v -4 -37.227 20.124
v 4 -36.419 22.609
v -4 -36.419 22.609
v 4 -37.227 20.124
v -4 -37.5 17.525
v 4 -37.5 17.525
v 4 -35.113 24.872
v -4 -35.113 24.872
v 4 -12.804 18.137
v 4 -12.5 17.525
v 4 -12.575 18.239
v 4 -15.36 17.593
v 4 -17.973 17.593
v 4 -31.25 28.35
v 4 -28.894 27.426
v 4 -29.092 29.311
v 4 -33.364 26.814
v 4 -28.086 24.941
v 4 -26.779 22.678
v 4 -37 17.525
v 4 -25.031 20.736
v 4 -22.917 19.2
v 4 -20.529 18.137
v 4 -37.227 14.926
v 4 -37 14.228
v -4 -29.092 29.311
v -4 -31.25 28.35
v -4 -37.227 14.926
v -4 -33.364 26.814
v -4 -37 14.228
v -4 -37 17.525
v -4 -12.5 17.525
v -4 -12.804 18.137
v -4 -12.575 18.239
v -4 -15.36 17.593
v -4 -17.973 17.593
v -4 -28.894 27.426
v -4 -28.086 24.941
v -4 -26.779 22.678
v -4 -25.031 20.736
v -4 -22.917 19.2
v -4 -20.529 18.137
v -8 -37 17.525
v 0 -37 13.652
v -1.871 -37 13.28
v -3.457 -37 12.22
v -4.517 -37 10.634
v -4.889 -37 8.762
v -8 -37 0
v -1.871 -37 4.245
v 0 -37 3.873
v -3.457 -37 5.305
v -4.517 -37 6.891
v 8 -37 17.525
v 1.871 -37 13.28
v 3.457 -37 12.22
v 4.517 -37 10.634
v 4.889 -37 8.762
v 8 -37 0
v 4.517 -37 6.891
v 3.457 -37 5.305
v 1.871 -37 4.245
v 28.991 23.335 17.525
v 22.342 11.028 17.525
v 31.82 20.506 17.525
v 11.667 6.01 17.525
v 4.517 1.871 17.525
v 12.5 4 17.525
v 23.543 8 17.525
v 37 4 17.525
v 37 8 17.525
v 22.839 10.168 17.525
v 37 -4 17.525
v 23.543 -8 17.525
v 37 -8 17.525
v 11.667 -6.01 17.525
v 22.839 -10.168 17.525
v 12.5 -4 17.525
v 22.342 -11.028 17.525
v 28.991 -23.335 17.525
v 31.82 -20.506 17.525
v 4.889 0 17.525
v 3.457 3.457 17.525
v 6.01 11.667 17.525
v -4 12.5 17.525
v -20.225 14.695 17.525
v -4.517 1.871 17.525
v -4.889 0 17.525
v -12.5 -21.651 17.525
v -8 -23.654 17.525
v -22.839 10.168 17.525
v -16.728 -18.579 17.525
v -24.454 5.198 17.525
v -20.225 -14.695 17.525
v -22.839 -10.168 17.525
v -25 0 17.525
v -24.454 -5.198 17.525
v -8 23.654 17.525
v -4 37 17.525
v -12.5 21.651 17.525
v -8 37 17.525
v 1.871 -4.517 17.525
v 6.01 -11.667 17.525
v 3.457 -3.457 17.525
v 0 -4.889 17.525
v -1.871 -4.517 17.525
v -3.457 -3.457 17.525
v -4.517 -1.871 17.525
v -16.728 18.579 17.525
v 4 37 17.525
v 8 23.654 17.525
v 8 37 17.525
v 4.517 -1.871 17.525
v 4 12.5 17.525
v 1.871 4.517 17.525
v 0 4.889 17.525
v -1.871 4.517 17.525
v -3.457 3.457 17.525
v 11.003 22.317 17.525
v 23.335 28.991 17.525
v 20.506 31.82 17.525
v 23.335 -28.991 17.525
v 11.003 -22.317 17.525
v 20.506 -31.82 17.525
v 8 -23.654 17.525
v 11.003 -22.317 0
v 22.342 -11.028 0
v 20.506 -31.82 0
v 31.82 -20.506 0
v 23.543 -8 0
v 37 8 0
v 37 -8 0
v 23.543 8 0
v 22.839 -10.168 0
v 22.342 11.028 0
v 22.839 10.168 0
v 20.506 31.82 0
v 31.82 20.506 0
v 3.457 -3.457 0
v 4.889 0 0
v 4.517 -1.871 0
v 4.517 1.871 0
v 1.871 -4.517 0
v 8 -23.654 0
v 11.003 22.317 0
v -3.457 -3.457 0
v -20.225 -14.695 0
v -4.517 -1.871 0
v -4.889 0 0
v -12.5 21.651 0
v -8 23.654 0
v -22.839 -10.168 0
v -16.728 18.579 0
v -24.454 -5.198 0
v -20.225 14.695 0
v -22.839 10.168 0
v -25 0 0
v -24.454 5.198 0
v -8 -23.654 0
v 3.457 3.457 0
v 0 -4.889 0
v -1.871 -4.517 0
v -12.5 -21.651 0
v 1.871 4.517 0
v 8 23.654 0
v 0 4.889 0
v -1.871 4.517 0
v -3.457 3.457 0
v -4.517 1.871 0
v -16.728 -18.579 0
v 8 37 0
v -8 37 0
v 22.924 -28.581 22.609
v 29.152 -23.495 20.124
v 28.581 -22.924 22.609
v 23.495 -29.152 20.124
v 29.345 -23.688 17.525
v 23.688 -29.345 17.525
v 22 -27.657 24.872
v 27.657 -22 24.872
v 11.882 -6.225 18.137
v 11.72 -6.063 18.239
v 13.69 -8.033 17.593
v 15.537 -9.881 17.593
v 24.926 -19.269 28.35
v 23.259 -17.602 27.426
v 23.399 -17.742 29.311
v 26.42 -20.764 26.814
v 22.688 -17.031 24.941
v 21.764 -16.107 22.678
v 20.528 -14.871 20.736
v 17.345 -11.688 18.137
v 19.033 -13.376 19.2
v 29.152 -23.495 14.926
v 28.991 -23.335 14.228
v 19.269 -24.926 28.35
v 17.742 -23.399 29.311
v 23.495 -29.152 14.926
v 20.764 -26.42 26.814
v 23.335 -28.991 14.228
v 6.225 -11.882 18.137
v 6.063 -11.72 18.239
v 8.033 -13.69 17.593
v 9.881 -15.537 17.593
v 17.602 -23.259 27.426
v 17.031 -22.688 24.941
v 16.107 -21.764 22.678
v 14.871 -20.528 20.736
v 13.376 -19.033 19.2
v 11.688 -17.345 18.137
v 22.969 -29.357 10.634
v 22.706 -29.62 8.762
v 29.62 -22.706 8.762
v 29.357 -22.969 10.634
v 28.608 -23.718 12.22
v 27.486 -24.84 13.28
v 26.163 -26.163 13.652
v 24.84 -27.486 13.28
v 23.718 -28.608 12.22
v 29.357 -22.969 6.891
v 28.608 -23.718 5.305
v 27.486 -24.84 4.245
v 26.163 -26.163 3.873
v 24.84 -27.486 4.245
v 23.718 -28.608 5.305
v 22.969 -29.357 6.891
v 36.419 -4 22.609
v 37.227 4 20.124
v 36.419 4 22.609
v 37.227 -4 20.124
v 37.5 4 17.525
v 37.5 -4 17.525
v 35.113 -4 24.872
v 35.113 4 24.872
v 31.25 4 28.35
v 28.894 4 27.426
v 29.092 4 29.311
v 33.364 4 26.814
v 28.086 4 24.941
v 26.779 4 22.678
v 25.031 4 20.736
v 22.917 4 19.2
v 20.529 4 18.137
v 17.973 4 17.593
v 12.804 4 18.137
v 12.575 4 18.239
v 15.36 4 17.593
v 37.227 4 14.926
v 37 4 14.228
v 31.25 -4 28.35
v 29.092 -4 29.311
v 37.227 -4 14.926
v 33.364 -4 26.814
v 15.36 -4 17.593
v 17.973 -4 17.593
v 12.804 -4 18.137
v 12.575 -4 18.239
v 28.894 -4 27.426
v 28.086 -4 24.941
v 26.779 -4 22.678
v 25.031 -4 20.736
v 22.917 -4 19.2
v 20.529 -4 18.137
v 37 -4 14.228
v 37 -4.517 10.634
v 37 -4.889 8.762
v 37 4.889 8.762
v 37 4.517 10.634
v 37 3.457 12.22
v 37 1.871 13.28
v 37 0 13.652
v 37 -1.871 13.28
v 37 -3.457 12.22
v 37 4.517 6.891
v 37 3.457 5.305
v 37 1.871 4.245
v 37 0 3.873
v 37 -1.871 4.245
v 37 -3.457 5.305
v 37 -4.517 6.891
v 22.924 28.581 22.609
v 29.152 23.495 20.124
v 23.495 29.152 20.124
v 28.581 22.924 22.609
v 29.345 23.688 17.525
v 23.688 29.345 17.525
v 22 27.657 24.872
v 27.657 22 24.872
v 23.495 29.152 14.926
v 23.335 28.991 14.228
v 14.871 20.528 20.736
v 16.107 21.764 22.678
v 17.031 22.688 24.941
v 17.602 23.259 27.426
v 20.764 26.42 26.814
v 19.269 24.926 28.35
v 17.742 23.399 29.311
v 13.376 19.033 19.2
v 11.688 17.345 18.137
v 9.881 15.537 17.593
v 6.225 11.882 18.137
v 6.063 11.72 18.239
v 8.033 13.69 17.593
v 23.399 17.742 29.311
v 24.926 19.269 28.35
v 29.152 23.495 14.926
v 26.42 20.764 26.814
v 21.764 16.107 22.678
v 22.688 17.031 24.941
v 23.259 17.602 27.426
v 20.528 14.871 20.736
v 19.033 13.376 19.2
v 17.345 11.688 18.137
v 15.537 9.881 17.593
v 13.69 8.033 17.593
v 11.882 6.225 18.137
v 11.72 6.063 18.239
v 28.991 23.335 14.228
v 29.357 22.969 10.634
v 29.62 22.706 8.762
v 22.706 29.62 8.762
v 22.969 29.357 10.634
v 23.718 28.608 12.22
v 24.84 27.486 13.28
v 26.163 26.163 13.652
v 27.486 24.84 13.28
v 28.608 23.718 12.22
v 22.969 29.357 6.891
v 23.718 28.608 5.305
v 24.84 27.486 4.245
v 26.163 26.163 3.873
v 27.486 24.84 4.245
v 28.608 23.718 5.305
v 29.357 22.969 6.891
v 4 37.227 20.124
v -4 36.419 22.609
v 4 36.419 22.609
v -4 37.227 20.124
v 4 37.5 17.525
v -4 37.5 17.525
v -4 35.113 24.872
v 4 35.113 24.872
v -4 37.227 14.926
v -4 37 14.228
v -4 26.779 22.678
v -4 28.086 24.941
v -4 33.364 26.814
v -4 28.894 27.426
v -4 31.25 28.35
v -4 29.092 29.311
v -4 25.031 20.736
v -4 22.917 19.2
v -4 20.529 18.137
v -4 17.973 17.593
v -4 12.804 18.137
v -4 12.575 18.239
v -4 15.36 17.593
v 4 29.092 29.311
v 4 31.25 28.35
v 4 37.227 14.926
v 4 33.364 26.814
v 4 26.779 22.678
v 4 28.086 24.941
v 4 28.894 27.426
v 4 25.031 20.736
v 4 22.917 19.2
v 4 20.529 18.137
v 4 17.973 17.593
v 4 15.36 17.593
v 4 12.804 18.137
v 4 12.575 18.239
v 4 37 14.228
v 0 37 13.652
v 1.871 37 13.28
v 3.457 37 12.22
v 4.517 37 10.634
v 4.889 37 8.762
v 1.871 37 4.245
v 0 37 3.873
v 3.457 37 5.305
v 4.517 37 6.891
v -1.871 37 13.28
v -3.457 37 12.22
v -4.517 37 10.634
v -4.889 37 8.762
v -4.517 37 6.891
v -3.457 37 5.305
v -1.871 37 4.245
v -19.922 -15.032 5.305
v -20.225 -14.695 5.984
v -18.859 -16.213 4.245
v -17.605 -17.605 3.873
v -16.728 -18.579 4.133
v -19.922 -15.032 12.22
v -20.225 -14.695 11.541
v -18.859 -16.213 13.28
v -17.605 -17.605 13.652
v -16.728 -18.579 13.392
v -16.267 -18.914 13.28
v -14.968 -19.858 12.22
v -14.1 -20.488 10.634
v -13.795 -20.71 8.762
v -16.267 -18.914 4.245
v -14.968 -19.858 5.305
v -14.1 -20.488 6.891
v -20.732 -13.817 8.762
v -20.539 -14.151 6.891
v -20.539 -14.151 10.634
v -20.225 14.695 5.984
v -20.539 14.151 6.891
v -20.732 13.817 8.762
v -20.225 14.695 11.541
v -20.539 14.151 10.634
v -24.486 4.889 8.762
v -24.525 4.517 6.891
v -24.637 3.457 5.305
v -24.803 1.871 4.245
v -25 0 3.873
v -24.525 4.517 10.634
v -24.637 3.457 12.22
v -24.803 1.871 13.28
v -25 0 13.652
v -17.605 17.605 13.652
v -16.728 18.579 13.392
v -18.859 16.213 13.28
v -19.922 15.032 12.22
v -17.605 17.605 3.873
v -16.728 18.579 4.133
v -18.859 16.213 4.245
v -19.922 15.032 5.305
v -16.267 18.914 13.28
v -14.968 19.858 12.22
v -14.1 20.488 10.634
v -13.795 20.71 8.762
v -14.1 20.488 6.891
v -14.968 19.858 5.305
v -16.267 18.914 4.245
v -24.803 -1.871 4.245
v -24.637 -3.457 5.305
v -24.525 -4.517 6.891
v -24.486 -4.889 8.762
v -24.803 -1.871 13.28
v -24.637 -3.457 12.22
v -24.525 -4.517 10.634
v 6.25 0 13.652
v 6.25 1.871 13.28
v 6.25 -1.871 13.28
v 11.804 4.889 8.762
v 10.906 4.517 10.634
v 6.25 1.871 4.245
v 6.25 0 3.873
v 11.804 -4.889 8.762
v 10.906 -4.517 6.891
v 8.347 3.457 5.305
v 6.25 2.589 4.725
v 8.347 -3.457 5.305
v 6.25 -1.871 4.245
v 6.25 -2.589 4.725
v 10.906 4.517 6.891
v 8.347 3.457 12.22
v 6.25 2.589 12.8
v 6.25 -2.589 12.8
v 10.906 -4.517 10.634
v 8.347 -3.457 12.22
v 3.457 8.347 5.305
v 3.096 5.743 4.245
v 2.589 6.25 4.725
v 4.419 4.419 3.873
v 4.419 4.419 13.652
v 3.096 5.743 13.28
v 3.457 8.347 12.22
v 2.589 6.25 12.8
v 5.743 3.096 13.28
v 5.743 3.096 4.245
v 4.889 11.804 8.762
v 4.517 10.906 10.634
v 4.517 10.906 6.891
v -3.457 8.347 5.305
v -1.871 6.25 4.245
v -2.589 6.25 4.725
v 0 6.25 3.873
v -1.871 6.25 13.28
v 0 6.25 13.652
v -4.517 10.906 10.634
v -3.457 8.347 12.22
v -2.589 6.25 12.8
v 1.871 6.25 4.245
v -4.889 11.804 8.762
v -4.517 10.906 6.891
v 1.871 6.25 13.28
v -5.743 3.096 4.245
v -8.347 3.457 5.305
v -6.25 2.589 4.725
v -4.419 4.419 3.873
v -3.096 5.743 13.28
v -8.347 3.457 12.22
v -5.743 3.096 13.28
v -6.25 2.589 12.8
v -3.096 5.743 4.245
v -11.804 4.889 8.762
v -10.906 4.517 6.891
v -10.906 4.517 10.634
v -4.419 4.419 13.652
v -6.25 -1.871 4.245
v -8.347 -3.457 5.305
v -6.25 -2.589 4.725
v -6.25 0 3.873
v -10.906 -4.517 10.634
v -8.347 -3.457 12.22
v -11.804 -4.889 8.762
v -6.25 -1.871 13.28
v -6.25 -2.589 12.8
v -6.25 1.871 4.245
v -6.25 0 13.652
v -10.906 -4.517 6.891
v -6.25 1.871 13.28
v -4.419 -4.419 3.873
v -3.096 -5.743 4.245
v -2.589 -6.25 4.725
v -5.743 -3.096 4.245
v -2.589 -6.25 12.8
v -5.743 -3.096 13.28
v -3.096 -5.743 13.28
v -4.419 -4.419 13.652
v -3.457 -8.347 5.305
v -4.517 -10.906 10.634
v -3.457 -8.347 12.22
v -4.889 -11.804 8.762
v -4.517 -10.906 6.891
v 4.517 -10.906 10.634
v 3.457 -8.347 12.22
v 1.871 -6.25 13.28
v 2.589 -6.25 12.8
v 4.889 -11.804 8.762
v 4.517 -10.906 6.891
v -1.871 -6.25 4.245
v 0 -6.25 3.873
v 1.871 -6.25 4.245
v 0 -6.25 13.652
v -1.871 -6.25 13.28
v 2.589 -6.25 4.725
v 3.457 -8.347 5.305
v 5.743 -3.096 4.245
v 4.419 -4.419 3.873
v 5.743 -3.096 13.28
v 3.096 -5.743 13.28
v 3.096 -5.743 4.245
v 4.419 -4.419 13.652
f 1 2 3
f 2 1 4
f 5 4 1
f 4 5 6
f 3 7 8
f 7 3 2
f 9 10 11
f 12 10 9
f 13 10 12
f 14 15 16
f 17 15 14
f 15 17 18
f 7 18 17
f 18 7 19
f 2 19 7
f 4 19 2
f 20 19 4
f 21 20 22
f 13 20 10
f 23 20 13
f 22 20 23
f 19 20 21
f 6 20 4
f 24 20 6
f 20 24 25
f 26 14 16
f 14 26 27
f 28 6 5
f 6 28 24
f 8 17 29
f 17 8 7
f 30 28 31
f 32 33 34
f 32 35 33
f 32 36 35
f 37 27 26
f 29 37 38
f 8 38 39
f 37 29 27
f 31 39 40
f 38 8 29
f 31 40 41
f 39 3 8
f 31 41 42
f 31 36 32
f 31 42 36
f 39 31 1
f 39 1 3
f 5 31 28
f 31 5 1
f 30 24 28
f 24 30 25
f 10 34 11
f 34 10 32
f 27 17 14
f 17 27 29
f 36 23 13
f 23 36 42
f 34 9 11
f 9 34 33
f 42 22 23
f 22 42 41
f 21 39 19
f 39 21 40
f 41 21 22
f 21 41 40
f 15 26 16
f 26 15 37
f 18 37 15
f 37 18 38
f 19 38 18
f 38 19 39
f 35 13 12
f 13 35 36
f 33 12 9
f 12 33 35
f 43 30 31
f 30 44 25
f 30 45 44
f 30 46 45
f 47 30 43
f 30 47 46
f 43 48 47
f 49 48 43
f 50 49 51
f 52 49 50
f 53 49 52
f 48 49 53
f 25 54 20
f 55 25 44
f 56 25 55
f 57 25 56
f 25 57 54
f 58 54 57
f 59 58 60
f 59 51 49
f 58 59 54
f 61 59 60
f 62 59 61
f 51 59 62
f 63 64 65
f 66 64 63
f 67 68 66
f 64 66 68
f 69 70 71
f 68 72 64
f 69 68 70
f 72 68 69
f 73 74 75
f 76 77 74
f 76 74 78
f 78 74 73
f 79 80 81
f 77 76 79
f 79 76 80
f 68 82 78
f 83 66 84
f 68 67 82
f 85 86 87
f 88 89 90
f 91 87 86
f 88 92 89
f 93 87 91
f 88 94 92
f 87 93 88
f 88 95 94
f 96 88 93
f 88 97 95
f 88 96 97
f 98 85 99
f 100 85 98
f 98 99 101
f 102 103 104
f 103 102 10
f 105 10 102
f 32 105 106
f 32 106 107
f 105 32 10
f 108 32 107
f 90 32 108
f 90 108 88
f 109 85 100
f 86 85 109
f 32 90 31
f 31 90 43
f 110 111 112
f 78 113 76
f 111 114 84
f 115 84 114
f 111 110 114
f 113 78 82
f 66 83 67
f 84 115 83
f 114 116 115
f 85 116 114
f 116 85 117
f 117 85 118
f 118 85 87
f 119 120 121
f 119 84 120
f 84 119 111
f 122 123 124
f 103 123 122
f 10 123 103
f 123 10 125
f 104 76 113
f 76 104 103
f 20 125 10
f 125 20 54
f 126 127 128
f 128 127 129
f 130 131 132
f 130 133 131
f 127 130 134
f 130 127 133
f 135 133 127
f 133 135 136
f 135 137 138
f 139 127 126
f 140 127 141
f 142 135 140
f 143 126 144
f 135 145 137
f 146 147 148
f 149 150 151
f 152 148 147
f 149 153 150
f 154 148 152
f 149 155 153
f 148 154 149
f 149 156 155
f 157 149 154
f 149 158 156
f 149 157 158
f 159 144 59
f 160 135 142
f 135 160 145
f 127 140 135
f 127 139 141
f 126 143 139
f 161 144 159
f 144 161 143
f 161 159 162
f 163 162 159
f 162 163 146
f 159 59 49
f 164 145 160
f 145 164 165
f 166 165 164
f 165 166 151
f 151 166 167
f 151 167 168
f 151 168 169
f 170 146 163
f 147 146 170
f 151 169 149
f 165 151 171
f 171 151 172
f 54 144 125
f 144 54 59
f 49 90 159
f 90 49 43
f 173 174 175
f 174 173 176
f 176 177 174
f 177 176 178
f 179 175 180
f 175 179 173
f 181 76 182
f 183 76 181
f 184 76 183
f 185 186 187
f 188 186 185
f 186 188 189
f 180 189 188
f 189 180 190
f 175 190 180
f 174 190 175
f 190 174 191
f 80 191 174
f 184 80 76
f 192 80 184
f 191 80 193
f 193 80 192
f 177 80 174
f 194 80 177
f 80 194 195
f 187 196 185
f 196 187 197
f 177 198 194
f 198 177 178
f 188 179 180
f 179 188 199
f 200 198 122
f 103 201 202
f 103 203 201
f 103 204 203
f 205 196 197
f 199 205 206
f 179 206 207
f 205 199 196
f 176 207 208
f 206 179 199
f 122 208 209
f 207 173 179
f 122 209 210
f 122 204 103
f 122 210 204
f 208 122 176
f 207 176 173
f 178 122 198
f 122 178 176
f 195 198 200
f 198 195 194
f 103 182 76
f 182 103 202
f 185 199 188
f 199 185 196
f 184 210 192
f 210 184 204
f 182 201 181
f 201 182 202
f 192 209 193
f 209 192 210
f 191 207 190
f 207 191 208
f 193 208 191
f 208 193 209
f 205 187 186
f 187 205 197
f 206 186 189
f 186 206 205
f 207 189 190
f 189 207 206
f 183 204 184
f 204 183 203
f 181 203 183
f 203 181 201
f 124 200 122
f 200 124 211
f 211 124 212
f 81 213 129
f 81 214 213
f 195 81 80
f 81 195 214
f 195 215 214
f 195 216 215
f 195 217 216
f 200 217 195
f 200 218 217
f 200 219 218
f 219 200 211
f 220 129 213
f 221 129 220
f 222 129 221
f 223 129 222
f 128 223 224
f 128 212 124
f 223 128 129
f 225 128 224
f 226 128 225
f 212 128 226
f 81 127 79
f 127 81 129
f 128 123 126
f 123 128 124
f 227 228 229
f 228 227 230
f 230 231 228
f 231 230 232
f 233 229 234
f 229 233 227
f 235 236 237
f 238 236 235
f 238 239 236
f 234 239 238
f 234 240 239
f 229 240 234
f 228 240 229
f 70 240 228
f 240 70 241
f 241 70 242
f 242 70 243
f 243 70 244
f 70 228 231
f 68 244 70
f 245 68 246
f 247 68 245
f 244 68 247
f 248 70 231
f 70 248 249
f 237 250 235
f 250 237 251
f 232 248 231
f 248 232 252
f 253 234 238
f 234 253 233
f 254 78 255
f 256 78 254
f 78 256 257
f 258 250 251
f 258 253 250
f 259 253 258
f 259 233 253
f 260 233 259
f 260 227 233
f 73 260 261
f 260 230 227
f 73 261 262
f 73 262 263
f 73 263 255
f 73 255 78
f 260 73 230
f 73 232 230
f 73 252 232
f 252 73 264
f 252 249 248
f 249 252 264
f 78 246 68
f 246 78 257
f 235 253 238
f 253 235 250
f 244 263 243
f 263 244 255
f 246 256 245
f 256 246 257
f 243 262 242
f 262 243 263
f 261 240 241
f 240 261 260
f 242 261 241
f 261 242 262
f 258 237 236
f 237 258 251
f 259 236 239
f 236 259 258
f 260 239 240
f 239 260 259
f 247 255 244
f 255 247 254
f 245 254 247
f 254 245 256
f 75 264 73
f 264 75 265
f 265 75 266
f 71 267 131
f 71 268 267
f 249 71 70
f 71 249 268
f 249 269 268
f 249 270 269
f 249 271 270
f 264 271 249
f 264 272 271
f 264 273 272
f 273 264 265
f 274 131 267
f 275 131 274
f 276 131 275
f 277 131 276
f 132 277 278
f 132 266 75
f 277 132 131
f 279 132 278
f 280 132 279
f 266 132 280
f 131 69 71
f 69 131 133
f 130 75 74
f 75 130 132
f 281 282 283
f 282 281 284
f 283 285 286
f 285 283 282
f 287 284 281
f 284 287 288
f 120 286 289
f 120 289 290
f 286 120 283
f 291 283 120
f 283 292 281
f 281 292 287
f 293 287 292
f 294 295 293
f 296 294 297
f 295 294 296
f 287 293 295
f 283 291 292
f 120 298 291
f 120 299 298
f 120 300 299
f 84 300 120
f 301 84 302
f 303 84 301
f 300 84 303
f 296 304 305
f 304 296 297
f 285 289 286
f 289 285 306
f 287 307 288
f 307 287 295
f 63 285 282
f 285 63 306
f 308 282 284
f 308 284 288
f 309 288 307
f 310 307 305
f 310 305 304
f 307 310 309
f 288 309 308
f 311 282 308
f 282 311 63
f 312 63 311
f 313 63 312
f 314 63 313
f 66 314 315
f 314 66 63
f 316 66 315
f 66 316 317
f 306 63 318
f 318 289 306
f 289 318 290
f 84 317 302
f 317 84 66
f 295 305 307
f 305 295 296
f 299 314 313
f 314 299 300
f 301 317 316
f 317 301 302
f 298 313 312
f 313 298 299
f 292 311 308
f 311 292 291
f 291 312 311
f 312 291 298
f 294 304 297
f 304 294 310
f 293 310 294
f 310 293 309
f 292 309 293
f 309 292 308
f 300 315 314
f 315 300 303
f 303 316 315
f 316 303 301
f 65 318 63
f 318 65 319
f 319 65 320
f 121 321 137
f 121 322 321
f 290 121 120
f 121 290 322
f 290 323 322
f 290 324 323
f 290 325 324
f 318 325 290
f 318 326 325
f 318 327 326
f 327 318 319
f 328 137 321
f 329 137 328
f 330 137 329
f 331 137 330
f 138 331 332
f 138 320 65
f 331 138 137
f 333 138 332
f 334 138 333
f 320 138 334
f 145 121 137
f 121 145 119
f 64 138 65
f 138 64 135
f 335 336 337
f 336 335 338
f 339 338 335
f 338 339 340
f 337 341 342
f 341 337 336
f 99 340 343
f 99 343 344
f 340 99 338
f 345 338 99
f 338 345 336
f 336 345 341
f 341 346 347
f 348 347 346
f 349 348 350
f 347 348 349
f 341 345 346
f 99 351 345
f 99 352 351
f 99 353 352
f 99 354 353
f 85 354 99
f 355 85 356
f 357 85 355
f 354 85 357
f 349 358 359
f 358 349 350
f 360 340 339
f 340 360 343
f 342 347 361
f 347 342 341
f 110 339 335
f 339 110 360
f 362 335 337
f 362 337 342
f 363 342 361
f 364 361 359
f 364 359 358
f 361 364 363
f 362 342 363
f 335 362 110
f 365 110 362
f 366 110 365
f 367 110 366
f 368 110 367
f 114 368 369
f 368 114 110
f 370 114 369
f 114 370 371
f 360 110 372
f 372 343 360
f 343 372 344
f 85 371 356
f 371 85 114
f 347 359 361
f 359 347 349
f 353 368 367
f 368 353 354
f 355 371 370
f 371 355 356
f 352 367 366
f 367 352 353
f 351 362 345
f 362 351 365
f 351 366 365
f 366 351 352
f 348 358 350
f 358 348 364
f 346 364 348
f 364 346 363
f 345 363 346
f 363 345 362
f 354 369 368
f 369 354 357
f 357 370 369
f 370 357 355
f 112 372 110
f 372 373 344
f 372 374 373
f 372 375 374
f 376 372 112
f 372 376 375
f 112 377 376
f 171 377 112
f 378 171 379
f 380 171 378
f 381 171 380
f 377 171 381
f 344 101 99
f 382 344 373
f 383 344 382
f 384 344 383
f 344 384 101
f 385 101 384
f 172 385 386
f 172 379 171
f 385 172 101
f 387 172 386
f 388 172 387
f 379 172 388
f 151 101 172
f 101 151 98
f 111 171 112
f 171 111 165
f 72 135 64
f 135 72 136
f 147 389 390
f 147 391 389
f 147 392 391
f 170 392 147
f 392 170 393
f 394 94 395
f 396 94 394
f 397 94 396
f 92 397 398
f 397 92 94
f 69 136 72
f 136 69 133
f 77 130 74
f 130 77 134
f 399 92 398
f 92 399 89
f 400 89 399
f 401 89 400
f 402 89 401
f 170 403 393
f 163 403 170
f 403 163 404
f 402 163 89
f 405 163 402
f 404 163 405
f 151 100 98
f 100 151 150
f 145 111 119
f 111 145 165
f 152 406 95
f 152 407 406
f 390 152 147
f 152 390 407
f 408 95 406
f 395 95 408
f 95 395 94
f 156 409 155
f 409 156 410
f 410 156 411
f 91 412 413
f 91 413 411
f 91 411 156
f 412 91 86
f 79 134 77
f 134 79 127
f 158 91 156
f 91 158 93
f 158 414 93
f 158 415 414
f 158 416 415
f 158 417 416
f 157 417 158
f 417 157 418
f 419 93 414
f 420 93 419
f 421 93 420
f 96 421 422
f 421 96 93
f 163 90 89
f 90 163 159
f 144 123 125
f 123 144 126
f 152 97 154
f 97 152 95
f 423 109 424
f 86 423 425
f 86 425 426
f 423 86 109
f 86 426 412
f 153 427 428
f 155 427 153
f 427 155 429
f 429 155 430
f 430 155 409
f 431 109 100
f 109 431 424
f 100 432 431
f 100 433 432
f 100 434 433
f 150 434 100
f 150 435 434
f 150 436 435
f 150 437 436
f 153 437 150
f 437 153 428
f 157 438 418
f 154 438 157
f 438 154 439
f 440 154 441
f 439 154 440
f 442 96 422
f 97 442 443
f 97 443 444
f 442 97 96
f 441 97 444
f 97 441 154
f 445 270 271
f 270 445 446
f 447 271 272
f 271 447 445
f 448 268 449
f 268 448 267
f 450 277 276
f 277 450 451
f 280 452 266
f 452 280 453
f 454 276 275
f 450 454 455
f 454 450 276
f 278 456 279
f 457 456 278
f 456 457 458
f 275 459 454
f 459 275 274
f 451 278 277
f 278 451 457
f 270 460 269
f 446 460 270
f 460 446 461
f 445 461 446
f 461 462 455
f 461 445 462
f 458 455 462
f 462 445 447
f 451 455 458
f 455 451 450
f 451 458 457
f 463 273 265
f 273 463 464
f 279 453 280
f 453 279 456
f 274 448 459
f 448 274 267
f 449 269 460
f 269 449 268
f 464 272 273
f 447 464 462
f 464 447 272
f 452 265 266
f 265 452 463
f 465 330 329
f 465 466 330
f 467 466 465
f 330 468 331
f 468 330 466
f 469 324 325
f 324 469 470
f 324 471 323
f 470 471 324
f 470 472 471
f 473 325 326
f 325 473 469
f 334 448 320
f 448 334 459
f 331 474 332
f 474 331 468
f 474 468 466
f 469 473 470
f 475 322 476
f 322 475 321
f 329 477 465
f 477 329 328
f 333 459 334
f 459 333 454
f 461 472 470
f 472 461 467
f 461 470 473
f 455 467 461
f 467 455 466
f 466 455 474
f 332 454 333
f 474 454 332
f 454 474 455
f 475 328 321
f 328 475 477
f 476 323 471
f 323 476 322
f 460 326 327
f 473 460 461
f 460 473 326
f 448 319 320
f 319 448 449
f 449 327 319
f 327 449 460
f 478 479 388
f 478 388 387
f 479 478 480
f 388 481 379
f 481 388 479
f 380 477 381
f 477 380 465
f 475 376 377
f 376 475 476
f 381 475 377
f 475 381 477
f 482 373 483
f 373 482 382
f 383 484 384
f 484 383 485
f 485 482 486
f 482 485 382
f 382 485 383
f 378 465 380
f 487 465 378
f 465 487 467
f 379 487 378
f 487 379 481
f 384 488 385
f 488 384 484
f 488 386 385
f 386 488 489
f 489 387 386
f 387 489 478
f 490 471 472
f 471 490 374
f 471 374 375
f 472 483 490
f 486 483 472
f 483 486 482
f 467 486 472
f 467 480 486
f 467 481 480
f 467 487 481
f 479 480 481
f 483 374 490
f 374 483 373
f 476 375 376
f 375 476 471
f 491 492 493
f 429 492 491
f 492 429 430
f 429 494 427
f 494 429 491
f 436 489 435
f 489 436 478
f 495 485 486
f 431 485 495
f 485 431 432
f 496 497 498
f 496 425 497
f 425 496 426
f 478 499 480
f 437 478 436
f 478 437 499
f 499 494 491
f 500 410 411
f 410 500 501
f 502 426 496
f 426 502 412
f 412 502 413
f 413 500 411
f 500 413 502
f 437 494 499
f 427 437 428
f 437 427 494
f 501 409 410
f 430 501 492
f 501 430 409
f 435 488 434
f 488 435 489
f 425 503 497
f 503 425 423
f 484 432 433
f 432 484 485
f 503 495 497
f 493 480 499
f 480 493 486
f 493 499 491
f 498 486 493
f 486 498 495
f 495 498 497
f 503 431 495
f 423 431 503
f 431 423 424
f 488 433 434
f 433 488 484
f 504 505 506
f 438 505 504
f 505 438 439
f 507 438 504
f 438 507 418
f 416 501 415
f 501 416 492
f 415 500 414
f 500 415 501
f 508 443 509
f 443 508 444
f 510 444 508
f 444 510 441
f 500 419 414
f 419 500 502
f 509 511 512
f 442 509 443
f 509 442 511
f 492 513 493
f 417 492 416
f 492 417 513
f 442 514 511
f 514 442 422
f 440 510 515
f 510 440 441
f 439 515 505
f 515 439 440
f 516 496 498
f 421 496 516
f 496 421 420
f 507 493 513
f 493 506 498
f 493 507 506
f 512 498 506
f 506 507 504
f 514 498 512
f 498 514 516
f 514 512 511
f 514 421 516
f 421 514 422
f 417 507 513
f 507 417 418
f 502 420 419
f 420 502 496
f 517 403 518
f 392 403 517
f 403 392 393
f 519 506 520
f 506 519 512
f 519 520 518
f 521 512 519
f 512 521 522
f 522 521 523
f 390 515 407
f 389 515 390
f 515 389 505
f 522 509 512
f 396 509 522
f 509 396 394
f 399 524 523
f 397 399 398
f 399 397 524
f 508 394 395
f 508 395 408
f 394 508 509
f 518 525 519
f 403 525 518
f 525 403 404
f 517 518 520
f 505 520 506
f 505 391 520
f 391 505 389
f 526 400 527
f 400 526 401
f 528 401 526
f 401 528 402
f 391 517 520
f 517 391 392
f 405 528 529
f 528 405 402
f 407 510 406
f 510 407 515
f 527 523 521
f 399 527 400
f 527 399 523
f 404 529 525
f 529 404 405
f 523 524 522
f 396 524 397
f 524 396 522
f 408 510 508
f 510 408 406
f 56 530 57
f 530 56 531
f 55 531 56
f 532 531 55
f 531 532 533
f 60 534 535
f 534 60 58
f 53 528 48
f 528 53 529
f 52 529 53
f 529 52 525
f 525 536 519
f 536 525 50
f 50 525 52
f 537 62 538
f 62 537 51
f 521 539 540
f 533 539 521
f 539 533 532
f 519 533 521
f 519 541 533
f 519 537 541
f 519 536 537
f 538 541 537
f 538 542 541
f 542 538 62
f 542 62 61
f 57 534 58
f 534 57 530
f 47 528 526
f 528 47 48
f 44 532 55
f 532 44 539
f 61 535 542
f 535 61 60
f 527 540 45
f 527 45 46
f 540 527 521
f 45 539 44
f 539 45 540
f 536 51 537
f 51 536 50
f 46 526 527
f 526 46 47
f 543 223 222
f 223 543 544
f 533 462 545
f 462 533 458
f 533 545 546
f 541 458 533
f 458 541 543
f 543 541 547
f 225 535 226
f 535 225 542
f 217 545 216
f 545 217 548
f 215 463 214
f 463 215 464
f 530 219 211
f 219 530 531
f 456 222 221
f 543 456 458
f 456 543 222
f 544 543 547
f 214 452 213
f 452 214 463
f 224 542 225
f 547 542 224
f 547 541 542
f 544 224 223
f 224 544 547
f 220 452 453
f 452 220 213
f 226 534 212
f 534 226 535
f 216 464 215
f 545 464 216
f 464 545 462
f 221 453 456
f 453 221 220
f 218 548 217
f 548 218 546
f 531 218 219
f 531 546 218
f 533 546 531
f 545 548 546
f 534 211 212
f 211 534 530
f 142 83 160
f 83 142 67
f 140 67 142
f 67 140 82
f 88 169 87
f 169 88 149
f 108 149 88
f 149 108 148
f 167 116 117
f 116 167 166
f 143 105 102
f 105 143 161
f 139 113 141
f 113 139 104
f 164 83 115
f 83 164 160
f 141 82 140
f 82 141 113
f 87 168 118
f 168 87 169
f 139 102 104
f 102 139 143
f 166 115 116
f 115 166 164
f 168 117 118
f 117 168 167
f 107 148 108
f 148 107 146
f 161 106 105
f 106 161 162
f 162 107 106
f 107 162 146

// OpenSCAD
// Tinker Toy compatible Back Scratcher

function scale_in()=25.4;
function TinkerToy_rod_d(tol=0.0) = scale_in()*(3/8+tol);
function TinkerToy_hole_d(tol=0.01) = scale_in()*(3/8+tol);
function TinkerToy_wall_th(tol=0.0) = 4.0;

module TinkerScratch(paw_r=25.0) {
  difference() {
    // hull() {
     union() {
      cylinder(r=paw_r,h=TinkerToy_rod_d()+2*TinkerToy_wall_th());
      for(i=[-2:2]) assign(rotAngle=360*i/8) rotate([0,0,rotAngle]) {
	  translate([paw_r-TinkerToy_wall_th(),-2*TinkerToy_wall_th(),0]) 
	    cube(size=[4*TinkerToy_wall_th(),4*TinkerToy_wall_th(),TinkerToy_rod_d()+2*TinkerToy_wall_th()],center=false);
	  translate([paw_r,0,TinkerToy_rod_d()+2*TinkerToy_wall_th()]) rotate([90,0,0]) difference() {
	    cylinder(r=paw_r/2,h=2*TinkerToy_wall_th(),center=true);
	    translate([-paw_r/3,paw_r/2,0]) cylinder(r=paw_r/2,h=3*TinkerToy_wall_th(),center=true);
	  }
	 }
     }
    //  sphere($fn=8,r=0.25);
    // }
    translate([0,0,TinkerToy_wall_th()+TinkerToy_rod_d()/2])
	cylinder(r=TinkerToy_hole_d()/2,h=TinkerToy_rod_d()+3*TinkerToy_wall_th(),center=true);
    for(i=[0:7]) assign(rotAngle=360*i/8) rotate([0,0,rotAngle]) {
      translate([paw_r,0,TinkerToy_wall_th()+TinkerToy_rod_d()/2]) rotate([0,90,0]) cylinder(r=TinkerToy_hole_d()/2,h=3*paw_r/2,center=true);
    }
  }
}

TinkerScratch();
